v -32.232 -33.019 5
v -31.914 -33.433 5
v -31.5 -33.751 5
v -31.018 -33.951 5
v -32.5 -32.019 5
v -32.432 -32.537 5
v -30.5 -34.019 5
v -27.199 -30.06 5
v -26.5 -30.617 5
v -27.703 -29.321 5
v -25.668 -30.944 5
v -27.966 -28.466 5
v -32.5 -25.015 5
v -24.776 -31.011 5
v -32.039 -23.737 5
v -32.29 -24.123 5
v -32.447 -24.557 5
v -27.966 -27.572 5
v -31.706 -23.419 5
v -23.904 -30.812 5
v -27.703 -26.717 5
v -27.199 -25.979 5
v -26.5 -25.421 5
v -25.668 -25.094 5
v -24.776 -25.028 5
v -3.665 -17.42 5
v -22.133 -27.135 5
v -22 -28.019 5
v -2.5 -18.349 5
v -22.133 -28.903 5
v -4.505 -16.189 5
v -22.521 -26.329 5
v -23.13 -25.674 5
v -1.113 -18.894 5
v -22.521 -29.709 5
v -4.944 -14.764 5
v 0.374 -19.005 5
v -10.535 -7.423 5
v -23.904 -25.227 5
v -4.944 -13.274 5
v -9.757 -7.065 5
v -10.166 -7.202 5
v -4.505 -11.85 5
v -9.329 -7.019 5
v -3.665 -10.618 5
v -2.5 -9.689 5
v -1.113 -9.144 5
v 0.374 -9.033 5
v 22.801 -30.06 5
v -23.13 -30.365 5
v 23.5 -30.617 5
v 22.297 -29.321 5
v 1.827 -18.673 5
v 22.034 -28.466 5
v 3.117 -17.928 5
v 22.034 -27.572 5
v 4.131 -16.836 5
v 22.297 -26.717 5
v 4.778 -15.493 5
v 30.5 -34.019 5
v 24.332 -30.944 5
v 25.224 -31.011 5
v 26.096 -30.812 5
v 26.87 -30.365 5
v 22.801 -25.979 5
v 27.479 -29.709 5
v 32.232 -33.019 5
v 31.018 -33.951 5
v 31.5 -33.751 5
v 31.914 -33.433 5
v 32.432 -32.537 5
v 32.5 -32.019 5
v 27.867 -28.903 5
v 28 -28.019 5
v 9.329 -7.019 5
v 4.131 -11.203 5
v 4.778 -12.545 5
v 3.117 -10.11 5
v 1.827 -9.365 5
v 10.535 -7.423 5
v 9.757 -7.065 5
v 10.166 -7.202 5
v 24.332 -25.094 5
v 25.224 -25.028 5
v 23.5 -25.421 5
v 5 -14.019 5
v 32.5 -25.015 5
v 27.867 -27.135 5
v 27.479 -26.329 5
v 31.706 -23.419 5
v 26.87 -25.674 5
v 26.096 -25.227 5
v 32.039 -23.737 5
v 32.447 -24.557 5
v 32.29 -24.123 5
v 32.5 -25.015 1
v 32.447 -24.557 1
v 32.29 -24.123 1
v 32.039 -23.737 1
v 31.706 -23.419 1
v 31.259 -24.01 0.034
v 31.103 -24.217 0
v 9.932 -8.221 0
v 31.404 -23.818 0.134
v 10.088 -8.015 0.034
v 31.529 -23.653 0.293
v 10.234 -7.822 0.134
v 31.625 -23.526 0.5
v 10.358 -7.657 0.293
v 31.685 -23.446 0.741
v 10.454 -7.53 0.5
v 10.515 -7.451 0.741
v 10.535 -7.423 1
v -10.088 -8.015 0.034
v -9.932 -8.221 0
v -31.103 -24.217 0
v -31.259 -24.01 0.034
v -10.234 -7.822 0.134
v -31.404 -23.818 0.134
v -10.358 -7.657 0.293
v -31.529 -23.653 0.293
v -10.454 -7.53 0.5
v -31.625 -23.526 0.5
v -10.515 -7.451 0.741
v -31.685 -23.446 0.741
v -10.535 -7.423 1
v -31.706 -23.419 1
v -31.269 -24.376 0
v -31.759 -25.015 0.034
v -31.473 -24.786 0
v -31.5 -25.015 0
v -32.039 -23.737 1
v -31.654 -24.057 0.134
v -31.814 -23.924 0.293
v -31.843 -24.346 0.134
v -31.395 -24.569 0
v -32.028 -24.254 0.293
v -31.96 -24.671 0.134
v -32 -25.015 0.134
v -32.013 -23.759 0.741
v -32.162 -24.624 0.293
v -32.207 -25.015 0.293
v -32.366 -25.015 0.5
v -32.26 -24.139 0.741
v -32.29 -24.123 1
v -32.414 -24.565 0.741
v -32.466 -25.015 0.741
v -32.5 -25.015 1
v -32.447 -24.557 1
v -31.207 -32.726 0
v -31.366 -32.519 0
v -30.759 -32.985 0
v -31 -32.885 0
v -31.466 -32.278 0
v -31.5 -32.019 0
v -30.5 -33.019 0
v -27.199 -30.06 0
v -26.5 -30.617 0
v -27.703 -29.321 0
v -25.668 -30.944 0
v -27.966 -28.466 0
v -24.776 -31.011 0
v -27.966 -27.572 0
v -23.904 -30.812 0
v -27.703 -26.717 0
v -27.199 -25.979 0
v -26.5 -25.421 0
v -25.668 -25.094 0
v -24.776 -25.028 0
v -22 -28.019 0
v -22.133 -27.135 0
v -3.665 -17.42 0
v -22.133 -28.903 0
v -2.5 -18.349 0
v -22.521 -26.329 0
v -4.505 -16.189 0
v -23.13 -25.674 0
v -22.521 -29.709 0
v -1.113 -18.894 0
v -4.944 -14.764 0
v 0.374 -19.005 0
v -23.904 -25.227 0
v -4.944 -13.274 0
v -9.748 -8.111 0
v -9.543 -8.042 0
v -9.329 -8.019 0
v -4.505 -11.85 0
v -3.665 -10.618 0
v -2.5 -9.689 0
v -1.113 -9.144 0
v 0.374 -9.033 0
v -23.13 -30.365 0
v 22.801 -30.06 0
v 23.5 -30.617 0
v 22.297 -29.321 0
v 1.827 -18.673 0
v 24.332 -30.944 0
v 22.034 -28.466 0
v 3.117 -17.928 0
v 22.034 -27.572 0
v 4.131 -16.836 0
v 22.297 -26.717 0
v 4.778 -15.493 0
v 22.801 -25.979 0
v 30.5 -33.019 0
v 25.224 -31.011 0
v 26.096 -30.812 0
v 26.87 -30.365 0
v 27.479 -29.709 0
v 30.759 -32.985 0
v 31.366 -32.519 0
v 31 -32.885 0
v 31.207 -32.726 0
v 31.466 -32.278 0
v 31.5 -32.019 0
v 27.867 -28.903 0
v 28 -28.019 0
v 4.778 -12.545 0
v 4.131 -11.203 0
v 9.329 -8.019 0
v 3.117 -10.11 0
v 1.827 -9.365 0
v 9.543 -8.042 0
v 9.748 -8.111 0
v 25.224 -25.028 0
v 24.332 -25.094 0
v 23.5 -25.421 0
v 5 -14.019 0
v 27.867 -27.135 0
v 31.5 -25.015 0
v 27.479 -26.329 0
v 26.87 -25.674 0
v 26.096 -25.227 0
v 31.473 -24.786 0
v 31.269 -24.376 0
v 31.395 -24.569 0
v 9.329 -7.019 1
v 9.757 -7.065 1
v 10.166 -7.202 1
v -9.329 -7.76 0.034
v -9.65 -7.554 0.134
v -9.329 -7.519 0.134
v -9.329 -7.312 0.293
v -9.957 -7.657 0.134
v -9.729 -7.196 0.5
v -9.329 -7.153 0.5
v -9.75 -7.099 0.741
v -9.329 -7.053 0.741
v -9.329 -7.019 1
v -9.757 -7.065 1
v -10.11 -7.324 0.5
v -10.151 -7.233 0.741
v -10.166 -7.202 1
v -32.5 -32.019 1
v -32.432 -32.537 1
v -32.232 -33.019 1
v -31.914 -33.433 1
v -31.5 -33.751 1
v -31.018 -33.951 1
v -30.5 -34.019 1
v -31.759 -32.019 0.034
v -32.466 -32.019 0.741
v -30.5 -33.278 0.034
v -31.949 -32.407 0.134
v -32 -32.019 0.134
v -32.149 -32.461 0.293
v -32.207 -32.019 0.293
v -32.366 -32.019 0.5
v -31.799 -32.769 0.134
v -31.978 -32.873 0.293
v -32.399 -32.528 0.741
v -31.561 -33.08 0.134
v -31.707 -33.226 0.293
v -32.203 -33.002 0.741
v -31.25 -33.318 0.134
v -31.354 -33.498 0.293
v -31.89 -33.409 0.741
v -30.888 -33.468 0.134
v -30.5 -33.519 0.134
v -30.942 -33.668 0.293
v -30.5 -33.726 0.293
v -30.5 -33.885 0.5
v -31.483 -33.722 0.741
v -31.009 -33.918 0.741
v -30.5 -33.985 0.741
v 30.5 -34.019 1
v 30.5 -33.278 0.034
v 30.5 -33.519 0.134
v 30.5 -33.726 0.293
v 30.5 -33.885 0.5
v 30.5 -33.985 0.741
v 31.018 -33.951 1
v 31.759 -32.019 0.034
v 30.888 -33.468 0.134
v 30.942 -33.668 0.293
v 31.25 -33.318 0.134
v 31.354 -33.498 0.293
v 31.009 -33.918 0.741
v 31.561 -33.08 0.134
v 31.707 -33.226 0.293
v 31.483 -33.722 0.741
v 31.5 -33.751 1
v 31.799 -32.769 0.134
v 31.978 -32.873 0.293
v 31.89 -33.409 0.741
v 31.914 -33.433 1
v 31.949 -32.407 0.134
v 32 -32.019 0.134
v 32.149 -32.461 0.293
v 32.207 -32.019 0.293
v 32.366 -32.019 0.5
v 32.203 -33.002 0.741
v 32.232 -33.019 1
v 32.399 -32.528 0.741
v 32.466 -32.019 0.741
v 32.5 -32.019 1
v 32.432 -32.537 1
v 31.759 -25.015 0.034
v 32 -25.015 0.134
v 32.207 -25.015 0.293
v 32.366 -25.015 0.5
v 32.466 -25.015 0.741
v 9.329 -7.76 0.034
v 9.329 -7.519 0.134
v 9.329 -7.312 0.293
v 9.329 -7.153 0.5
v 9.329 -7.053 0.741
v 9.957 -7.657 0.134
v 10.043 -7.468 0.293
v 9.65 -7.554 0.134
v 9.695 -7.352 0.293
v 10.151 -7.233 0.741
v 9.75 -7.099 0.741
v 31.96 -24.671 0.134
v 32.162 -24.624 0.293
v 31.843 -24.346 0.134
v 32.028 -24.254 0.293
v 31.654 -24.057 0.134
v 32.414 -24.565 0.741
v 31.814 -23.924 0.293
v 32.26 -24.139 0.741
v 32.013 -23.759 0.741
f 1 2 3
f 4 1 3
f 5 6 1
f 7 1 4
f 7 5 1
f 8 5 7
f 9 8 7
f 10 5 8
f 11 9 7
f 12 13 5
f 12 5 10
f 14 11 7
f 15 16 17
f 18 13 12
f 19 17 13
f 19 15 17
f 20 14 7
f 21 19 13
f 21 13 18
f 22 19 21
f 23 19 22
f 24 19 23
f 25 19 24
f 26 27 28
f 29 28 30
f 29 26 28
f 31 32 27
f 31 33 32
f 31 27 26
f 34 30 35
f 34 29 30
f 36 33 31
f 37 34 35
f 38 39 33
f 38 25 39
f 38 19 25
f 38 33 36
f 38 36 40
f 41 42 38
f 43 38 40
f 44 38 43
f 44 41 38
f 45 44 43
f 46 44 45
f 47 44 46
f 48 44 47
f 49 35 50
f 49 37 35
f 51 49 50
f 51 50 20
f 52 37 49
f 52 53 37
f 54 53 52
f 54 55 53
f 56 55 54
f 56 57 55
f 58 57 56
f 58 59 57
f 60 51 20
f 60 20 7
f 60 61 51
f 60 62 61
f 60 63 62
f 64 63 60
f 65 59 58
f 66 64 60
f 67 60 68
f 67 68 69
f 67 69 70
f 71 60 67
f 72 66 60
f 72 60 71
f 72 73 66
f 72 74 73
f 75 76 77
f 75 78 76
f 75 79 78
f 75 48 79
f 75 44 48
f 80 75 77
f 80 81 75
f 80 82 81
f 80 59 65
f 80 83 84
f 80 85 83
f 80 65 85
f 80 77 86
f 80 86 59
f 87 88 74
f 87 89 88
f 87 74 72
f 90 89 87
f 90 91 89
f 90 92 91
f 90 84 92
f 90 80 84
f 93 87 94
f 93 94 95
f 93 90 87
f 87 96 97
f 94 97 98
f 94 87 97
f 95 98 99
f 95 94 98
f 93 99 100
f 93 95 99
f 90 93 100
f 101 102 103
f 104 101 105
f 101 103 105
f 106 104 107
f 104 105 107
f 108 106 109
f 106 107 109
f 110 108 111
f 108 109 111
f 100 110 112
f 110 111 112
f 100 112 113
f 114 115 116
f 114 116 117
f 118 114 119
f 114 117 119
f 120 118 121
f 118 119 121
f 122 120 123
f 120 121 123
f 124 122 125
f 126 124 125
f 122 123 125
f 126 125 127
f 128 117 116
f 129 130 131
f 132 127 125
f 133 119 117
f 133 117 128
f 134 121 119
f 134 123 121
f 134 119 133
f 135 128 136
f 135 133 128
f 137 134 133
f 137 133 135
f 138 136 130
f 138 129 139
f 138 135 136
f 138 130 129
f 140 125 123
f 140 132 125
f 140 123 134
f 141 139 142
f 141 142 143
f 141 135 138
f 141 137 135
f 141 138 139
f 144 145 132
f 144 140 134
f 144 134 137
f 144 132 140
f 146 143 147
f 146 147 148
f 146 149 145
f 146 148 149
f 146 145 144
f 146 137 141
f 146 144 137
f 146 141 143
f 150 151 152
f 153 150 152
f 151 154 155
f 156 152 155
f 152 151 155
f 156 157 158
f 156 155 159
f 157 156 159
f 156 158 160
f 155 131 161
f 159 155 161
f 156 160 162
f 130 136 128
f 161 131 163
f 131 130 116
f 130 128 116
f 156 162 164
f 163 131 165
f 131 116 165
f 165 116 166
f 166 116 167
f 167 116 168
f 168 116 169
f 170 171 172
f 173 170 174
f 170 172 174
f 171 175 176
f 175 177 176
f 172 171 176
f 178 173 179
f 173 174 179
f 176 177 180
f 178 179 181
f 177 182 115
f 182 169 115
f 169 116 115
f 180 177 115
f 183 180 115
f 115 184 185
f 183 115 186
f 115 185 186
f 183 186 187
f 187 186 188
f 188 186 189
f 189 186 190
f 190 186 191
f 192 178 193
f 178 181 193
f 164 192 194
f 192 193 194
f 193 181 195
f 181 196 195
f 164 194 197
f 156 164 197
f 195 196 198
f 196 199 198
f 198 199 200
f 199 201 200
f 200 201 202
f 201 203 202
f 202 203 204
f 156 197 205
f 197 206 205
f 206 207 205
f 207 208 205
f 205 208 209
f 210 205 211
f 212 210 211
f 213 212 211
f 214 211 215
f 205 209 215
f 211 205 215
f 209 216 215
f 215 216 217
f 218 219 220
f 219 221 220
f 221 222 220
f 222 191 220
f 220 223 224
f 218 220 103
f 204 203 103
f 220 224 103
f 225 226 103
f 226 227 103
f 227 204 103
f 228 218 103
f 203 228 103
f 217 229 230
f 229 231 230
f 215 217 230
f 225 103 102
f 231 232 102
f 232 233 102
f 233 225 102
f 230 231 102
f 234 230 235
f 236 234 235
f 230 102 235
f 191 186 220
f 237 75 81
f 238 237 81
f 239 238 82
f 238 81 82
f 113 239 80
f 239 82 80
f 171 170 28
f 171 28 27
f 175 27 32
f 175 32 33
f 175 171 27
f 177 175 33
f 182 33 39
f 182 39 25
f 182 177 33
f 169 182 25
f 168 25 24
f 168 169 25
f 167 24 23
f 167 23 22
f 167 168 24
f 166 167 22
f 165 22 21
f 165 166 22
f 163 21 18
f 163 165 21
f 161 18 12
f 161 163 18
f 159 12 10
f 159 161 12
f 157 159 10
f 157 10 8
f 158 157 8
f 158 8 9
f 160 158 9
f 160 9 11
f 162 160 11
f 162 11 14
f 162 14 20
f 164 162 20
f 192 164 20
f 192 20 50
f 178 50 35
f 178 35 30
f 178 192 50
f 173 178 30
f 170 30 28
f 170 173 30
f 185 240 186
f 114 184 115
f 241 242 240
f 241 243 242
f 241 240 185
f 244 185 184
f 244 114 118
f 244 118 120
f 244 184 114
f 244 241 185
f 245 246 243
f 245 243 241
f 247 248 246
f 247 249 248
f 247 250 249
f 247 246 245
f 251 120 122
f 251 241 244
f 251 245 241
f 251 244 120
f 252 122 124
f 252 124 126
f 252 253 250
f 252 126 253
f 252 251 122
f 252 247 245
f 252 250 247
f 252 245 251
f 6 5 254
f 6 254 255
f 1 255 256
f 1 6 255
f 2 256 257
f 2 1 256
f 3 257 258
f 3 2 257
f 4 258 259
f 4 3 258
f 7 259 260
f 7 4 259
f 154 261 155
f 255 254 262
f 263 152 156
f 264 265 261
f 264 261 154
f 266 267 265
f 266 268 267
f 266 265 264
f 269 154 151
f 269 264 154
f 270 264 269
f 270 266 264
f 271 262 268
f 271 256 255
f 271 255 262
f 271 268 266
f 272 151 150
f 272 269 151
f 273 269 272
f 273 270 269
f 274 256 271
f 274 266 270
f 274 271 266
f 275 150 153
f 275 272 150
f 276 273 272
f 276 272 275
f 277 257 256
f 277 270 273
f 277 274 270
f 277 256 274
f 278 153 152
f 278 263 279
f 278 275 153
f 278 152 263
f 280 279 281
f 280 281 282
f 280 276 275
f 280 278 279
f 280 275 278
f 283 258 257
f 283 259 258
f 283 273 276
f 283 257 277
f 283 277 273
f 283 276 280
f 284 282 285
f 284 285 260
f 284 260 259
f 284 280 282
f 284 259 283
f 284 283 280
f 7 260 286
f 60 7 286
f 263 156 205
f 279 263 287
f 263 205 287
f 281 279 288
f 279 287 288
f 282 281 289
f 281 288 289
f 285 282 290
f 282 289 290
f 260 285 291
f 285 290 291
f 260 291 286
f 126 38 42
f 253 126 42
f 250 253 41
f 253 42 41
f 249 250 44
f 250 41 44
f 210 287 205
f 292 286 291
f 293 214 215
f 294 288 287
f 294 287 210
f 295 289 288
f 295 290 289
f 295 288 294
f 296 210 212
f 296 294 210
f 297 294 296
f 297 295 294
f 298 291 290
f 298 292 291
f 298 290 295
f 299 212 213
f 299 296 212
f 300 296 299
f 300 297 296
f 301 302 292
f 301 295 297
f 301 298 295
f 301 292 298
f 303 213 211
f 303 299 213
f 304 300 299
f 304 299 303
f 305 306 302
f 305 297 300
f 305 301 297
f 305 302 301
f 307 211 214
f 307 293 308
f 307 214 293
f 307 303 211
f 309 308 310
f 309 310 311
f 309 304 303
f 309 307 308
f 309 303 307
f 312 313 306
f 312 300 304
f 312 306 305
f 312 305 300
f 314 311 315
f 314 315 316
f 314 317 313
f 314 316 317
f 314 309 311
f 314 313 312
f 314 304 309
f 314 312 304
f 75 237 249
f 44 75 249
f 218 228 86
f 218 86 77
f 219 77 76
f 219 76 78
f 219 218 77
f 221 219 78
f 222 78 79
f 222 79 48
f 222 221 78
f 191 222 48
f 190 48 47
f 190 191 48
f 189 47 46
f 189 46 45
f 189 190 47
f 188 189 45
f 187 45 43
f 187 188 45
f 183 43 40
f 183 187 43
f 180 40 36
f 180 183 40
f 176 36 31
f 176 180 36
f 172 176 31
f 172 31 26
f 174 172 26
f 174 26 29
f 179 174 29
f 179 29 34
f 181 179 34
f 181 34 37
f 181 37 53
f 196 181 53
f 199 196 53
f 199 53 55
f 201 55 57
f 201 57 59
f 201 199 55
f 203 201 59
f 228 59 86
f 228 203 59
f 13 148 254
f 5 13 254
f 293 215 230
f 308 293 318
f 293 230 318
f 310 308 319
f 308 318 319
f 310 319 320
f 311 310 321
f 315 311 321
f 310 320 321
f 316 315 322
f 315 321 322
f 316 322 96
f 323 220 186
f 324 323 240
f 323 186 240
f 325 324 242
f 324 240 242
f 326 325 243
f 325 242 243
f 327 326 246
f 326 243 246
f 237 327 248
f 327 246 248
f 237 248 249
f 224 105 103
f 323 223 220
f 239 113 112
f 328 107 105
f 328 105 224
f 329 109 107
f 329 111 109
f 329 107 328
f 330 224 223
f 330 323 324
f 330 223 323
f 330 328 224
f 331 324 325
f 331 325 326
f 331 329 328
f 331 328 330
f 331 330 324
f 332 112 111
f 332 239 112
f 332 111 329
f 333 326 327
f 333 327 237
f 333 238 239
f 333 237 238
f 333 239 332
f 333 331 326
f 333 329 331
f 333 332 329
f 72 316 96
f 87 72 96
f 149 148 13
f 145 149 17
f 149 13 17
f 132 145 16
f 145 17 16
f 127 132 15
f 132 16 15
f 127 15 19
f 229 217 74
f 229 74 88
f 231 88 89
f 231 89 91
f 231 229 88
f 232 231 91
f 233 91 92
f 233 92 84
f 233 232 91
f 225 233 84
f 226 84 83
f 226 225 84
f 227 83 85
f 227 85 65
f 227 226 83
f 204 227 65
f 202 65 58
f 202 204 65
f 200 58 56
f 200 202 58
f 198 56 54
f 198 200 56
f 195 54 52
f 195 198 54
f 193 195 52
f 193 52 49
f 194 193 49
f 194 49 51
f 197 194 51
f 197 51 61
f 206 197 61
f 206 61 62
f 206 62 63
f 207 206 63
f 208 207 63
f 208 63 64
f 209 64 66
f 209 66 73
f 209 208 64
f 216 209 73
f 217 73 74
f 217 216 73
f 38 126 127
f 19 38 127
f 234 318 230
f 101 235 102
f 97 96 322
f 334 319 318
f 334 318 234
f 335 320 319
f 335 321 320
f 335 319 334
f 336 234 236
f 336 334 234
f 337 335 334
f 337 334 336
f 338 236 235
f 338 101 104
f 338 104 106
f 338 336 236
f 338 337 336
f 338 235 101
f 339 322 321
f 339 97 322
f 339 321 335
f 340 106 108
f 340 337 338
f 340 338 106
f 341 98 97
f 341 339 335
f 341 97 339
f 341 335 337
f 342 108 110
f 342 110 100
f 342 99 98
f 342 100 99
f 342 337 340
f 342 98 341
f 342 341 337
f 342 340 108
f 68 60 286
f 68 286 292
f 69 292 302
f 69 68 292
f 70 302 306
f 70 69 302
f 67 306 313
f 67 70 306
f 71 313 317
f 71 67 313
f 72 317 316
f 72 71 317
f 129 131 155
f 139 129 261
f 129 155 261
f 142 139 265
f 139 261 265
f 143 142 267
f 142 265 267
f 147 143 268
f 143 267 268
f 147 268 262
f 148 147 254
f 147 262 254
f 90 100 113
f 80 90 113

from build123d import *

# Parameters (mm, degrees)
F0_R     = 3
F0_R_2   = 5
F1_DEPTH = 5
F2_R     = 2
F3_R     = 1


with BuildPart() as f1:
    # F0 (on Top) → F1 (new body)
    with BuildSketch(Plane.XY):
        Polygon((-32.5, -24.019127), (-32.5, -34.019127), (32.5, -34.019127), (32.5, -24.019127), (10, -7.019127), (-10, -7.019127), align=None)
        with Locations((-25, -28.019127)):
            Circle(F0_R, mode=Mode.SUBTRACT)
        with Locations((25, -28.019127)):
            Circle(F0_R, mode=Mode.SUBTRACT)
        with Locations((0, -14.019127)):
            Circle(F0_R_2, mode=Mode.SUBTRACT)
    extrude(amount=F1_DEPTH)

    # F2
    f2_edges = [f1.edges().sort_by_distance(p)[0] for p in [
        (-10, -7.019127, 2.5),
        (-32.5, -24.019127, 2.5),
        (10, -7.019127, 2.5),
        (32.5, -24.019127, 2.5),
        (-32.5, -34.019127, 2.5),
        (32.5, -34.019127, 2.5),
    ]]
    fillet(f2_edges, radius=F2_R)

    # F3
    f3_edges = [f1.edges().sort_by_distance(p)[0] for p in [
        (-21.120362, -15.421178, 0),
        (-32.5, -28.516913, 0),
        (0, -34.019127, 0),
        (32.5, -28.516913, 0),
        (21.120362, -15.421178, 0),
        (0, -7.019127, 0),
    ]]
    fillet(f3_edges, radius=F3_R)


solid = f1.part
